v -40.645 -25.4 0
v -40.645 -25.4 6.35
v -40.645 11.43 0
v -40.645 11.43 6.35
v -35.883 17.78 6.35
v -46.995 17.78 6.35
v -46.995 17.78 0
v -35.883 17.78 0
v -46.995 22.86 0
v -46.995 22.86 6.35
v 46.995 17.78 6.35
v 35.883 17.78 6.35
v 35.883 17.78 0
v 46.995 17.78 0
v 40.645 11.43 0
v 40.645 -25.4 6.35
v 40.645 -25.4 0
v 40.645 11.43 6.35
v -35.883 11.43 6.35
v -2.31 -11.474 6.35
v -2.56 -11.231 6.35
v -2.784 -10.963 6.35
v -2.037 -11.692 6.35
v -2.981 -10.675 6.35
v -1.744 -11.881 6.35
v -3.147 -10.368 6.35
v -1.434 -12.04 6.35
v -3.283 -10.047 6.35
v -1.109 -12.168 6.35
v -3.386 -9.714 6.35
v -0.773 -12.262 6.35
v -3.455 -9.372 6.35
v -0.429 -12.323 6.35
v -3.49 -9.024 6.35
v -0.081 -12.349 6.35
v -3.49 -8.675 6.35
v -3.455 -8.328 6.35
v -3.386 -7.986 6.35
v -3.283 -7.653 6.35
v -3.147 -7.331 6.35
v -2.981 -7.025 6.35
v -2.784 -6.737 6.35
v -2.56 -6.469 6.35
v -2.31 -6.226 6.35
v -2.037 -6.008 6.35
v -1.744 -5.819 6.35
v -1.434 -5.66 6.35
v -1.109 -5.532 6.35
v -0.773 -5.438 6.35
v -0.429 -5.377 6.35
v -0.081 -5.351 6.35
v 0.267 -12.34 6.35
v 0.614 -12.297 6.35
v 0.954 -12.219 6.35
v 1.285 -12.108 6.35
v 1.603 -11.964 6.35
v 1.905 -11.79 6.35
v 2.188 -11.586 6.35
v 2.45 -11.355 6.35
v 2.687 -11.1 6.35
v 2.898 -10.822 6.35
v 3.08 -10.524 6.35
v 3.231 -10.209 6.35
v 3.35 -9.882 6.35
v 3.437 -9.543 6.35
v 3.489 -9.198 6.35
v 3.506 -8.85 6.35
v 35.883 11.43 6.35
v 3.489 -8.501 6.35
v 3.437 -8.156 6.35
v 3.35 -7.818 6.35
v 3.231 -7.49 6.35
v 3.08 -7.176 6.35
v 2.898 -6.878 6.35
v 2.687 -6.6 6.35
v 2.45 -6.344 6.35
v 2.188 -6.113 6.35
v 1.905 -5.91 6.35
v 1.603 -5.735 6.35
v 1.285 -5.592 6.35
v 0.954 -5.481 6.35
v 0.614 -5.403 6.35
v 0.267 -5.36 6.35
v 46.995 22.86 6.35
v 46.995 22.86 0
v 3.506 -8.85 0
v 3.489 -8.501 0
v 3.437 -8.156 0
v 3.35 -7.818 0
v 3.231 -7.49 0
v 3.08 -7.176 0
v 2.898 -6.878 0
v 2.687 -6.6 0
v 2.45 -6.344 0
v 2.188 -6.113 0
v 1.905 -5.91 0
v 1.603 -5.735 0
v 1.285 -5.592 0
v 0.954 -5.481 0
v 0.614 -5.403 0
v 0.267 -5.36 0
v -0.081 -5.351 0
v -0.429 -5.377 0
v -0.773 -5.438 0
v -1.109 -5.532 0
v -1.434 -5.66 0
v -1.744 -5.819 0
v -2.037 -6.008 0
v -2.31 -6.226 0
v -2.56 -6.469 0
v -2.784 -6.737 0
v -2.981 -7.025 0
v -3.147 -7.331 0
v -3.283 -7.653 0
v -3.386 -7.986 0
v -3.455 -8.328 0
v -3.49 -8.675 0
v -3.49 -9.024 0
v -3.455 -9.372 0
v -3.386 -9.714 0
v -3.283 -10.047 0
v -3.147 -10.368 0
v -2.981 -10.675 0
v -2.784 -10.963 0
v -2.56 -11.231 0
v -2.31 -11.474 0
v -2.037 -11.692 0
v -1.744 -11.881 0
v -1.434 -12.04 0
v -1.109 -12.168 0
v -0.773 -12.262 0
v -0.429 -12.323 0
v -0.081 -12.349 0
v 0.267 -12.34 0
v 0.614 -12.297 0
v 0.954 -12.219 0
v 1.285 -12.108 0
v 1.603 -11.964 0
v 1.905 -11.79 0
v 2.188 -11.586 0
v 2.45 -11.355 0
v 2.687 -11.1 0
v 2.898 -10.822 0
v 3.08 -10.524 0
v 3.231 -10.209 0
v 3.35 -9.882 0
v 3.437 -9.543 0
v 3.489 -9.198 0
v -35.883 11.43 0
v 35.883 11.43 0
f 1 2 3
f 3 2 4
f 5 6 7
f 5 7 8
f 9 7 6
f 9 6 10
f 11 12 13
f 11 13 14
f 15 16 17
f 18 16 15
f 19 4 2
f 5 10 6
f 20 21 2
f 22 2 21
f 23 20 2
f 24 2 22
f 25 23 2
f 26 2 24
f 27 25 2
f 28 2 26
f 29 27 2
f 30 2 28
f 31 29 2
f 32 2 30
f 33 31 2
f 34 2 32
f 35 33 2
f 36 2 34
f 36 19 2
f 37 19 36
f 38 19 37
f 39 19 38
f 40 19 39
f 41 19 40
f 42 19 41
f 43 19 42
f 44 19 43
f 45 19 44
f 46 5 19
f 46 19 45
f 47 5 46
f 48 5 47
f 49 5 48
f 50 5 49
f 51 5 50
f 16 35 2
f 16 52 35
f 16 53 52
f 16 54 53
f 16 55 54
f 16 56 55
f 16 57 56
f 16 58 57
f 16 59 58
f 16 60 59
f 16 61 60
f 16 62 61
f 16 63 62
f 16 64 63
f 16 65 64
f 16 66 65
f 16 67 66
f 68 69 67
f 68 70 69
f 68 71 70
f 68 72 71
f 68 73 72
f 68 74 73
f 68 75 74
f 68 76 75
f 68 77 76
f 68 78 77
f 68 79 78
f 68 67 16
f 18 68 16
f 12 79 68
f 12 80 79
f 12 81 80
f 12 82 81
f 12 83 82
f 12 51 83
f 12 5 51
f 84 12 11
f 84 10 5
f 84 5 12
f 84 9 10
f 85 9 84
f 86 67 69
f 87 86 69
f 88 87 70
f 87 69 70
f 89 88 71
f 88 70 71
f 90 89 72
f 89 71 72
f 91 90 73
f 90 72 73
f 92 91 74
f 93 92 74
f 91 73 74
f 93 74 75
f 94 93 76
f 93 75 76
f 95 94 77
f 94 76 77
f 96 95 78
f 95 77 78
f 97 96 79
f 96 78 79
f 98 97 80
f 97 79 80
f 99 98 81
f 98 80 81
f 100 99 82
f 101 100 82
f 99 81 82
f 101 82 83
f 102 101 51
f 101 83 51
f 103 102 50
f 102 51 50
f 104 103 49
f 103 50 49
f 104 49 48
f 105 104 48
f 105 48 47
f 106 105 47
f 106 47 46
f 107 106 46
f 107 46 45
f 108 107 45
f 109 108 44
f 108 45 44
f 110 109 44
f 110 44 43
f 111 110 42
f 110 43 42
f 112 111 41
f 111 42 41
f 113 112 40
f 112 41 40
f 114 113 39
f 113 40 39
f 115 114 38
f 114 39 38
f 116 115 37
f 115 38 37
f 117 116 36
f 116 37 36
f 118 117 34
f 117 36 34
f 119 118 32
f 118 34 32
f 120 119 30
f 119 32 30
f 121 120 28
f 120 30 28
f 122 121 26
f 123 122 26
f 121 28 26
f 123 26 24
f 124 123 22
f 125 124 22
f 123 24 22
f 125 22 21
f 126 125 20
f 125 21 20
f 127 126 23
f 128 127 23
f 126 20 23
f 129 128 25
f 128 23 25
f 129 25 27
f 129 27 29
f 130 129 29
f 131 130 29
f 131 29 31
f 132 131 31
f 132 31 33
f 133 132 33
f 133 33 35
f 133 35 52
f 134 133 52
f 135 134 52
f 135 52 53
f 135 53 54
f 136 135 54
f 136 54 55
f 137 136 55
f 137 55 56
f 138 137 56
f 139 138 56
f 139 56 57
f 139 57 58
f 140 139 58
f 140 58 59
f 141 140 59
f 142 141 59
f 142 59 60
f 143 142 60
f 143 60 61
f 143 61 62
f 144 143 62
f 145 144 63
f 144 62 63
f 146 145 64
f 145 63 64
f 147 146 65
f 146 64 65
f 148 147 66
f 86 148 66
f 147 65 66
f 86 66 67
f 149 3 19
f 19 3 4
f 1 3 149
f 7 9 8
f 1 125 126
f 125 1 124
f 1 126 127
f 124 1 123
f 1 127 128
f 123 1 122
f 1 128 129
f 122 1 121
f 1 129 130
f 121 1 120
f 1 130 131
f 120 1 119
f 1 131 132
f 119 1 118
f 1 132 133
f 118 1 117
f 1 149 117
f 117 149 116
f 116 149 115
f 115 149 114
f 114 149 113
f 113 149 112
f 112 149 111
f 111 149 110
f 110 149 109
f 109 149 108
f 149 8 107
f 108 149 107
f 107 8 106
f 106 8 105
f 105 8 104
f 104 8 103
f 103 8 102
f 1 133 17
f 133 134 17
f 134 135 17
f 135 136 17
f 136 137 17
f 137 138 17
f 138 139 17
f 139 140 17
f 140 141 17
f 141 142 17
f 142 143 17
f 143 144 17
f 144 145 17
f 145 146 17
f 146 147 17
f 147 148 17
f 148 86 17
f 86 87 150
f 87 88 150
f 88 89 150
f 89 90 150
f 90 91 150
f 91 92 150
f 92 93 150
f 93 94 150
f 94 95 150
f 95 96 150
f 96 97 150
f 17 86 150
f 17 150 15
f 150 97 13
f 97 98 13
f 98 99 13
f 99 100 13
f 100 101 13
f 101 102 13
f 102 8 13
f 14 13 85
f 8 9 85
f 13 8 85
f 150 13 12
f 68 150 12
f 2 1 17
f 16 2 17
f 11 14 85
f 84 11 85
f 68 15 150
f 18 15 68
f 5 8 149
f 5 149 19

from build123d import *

# Parameters (mm, degrees)
SKETCH1_W           = 93.99016
SKETCH1_H           = 50.8
BOSS_EXTRUDE1_DEPTH = 6.35
SKETCH2_W           = 6.35
SKETCH2_H           = 43.18
CUT_EXTRUDE1_DEPTH  = 6.35
SKETCH3_W           = 93.99016
SKETCH3_H           = 6.35
CUT_EXTRUDE2_DEPTH  = 2.54
SKETCH5_W           = 6.35
SKETCH5_H           = 6.35
CUT_EXTRUDE3_DEPTH  = 4.7625
SKETCH6_R           = 3.5
CUT_EXTRUDE4_DEPTH  = 6.35


with BuildPart() as part:
    # Sketch1 → Boss-Extrude1 (new body)
    with BuildSketch(Plane.XY):
        Rectangle(SKETCH1_W, SKETCH1_H)
    extrude(amount=BOSS_EXTRUDE1_DEPTH)

    # Sketch2 → Cut-Extrude1 (cut)
    with BuildSketch(Plane.XY.offset(6.35)):
        with Locations((-43.82008, -3.81)):
            Rectangle(SKETCH2_W, SKETCH2_H)
        with Locations((43.82008, -3.81)):
            Rectangle(SKETCH2_W, SKETCH2_H)
    extrude(amount=-CUT_EXTRUDE1_DEPTH, mode=Mode.SUBTRACT)

    # Sketch3 → Cut-Extrude2 (cut)
    with BuildSketch(Plane(origin=(0, 25.4, 0), x_dir=(1, 0, 0), z_dir=(0, 1, 0))):
        with Locations((0, -3.175)):
            Rectangle(SKETCH3_W, SKETCH3_H)
    extrude(amount=-CUT_EXTRUDE2_DEPTH, mode=Mode.SUBTRACT)

    # Sketch5 → Cut-Extrude3 (cut)
    with BuildSketch(Plane.ZY.offset(40.64508)):
        with Locations((3.175, 14.605)):
            Rectangle(SKETCH5_W, SKETCH5_H)
    cut_extrude3 = extrude(amount=-CUT_EXTRUDE3_DEPTH, mode=Mode.SUBTRACT)

    # Mirror1: Cut-Extrude3 across plane
    add(cut_extrude3.mirror(Plane(origin=(0, 0, 0), x_dir=(0, 0, 1), z_dir=(1, 0, 0))), mode=Mode.SUBTRACT)

    # Sketch6 → Cut-Extrude4 (cut)
    with BuildSketch(Plane.XY.offset(6.35)):
        with Locations((0.00592, -8.8499)):
            Circle(SKETCH6_R)
    extrude(amount=-CUT_EXTRUDE4_DEPTH, mode=Mode.SUBTRACT)


solid = part.part
